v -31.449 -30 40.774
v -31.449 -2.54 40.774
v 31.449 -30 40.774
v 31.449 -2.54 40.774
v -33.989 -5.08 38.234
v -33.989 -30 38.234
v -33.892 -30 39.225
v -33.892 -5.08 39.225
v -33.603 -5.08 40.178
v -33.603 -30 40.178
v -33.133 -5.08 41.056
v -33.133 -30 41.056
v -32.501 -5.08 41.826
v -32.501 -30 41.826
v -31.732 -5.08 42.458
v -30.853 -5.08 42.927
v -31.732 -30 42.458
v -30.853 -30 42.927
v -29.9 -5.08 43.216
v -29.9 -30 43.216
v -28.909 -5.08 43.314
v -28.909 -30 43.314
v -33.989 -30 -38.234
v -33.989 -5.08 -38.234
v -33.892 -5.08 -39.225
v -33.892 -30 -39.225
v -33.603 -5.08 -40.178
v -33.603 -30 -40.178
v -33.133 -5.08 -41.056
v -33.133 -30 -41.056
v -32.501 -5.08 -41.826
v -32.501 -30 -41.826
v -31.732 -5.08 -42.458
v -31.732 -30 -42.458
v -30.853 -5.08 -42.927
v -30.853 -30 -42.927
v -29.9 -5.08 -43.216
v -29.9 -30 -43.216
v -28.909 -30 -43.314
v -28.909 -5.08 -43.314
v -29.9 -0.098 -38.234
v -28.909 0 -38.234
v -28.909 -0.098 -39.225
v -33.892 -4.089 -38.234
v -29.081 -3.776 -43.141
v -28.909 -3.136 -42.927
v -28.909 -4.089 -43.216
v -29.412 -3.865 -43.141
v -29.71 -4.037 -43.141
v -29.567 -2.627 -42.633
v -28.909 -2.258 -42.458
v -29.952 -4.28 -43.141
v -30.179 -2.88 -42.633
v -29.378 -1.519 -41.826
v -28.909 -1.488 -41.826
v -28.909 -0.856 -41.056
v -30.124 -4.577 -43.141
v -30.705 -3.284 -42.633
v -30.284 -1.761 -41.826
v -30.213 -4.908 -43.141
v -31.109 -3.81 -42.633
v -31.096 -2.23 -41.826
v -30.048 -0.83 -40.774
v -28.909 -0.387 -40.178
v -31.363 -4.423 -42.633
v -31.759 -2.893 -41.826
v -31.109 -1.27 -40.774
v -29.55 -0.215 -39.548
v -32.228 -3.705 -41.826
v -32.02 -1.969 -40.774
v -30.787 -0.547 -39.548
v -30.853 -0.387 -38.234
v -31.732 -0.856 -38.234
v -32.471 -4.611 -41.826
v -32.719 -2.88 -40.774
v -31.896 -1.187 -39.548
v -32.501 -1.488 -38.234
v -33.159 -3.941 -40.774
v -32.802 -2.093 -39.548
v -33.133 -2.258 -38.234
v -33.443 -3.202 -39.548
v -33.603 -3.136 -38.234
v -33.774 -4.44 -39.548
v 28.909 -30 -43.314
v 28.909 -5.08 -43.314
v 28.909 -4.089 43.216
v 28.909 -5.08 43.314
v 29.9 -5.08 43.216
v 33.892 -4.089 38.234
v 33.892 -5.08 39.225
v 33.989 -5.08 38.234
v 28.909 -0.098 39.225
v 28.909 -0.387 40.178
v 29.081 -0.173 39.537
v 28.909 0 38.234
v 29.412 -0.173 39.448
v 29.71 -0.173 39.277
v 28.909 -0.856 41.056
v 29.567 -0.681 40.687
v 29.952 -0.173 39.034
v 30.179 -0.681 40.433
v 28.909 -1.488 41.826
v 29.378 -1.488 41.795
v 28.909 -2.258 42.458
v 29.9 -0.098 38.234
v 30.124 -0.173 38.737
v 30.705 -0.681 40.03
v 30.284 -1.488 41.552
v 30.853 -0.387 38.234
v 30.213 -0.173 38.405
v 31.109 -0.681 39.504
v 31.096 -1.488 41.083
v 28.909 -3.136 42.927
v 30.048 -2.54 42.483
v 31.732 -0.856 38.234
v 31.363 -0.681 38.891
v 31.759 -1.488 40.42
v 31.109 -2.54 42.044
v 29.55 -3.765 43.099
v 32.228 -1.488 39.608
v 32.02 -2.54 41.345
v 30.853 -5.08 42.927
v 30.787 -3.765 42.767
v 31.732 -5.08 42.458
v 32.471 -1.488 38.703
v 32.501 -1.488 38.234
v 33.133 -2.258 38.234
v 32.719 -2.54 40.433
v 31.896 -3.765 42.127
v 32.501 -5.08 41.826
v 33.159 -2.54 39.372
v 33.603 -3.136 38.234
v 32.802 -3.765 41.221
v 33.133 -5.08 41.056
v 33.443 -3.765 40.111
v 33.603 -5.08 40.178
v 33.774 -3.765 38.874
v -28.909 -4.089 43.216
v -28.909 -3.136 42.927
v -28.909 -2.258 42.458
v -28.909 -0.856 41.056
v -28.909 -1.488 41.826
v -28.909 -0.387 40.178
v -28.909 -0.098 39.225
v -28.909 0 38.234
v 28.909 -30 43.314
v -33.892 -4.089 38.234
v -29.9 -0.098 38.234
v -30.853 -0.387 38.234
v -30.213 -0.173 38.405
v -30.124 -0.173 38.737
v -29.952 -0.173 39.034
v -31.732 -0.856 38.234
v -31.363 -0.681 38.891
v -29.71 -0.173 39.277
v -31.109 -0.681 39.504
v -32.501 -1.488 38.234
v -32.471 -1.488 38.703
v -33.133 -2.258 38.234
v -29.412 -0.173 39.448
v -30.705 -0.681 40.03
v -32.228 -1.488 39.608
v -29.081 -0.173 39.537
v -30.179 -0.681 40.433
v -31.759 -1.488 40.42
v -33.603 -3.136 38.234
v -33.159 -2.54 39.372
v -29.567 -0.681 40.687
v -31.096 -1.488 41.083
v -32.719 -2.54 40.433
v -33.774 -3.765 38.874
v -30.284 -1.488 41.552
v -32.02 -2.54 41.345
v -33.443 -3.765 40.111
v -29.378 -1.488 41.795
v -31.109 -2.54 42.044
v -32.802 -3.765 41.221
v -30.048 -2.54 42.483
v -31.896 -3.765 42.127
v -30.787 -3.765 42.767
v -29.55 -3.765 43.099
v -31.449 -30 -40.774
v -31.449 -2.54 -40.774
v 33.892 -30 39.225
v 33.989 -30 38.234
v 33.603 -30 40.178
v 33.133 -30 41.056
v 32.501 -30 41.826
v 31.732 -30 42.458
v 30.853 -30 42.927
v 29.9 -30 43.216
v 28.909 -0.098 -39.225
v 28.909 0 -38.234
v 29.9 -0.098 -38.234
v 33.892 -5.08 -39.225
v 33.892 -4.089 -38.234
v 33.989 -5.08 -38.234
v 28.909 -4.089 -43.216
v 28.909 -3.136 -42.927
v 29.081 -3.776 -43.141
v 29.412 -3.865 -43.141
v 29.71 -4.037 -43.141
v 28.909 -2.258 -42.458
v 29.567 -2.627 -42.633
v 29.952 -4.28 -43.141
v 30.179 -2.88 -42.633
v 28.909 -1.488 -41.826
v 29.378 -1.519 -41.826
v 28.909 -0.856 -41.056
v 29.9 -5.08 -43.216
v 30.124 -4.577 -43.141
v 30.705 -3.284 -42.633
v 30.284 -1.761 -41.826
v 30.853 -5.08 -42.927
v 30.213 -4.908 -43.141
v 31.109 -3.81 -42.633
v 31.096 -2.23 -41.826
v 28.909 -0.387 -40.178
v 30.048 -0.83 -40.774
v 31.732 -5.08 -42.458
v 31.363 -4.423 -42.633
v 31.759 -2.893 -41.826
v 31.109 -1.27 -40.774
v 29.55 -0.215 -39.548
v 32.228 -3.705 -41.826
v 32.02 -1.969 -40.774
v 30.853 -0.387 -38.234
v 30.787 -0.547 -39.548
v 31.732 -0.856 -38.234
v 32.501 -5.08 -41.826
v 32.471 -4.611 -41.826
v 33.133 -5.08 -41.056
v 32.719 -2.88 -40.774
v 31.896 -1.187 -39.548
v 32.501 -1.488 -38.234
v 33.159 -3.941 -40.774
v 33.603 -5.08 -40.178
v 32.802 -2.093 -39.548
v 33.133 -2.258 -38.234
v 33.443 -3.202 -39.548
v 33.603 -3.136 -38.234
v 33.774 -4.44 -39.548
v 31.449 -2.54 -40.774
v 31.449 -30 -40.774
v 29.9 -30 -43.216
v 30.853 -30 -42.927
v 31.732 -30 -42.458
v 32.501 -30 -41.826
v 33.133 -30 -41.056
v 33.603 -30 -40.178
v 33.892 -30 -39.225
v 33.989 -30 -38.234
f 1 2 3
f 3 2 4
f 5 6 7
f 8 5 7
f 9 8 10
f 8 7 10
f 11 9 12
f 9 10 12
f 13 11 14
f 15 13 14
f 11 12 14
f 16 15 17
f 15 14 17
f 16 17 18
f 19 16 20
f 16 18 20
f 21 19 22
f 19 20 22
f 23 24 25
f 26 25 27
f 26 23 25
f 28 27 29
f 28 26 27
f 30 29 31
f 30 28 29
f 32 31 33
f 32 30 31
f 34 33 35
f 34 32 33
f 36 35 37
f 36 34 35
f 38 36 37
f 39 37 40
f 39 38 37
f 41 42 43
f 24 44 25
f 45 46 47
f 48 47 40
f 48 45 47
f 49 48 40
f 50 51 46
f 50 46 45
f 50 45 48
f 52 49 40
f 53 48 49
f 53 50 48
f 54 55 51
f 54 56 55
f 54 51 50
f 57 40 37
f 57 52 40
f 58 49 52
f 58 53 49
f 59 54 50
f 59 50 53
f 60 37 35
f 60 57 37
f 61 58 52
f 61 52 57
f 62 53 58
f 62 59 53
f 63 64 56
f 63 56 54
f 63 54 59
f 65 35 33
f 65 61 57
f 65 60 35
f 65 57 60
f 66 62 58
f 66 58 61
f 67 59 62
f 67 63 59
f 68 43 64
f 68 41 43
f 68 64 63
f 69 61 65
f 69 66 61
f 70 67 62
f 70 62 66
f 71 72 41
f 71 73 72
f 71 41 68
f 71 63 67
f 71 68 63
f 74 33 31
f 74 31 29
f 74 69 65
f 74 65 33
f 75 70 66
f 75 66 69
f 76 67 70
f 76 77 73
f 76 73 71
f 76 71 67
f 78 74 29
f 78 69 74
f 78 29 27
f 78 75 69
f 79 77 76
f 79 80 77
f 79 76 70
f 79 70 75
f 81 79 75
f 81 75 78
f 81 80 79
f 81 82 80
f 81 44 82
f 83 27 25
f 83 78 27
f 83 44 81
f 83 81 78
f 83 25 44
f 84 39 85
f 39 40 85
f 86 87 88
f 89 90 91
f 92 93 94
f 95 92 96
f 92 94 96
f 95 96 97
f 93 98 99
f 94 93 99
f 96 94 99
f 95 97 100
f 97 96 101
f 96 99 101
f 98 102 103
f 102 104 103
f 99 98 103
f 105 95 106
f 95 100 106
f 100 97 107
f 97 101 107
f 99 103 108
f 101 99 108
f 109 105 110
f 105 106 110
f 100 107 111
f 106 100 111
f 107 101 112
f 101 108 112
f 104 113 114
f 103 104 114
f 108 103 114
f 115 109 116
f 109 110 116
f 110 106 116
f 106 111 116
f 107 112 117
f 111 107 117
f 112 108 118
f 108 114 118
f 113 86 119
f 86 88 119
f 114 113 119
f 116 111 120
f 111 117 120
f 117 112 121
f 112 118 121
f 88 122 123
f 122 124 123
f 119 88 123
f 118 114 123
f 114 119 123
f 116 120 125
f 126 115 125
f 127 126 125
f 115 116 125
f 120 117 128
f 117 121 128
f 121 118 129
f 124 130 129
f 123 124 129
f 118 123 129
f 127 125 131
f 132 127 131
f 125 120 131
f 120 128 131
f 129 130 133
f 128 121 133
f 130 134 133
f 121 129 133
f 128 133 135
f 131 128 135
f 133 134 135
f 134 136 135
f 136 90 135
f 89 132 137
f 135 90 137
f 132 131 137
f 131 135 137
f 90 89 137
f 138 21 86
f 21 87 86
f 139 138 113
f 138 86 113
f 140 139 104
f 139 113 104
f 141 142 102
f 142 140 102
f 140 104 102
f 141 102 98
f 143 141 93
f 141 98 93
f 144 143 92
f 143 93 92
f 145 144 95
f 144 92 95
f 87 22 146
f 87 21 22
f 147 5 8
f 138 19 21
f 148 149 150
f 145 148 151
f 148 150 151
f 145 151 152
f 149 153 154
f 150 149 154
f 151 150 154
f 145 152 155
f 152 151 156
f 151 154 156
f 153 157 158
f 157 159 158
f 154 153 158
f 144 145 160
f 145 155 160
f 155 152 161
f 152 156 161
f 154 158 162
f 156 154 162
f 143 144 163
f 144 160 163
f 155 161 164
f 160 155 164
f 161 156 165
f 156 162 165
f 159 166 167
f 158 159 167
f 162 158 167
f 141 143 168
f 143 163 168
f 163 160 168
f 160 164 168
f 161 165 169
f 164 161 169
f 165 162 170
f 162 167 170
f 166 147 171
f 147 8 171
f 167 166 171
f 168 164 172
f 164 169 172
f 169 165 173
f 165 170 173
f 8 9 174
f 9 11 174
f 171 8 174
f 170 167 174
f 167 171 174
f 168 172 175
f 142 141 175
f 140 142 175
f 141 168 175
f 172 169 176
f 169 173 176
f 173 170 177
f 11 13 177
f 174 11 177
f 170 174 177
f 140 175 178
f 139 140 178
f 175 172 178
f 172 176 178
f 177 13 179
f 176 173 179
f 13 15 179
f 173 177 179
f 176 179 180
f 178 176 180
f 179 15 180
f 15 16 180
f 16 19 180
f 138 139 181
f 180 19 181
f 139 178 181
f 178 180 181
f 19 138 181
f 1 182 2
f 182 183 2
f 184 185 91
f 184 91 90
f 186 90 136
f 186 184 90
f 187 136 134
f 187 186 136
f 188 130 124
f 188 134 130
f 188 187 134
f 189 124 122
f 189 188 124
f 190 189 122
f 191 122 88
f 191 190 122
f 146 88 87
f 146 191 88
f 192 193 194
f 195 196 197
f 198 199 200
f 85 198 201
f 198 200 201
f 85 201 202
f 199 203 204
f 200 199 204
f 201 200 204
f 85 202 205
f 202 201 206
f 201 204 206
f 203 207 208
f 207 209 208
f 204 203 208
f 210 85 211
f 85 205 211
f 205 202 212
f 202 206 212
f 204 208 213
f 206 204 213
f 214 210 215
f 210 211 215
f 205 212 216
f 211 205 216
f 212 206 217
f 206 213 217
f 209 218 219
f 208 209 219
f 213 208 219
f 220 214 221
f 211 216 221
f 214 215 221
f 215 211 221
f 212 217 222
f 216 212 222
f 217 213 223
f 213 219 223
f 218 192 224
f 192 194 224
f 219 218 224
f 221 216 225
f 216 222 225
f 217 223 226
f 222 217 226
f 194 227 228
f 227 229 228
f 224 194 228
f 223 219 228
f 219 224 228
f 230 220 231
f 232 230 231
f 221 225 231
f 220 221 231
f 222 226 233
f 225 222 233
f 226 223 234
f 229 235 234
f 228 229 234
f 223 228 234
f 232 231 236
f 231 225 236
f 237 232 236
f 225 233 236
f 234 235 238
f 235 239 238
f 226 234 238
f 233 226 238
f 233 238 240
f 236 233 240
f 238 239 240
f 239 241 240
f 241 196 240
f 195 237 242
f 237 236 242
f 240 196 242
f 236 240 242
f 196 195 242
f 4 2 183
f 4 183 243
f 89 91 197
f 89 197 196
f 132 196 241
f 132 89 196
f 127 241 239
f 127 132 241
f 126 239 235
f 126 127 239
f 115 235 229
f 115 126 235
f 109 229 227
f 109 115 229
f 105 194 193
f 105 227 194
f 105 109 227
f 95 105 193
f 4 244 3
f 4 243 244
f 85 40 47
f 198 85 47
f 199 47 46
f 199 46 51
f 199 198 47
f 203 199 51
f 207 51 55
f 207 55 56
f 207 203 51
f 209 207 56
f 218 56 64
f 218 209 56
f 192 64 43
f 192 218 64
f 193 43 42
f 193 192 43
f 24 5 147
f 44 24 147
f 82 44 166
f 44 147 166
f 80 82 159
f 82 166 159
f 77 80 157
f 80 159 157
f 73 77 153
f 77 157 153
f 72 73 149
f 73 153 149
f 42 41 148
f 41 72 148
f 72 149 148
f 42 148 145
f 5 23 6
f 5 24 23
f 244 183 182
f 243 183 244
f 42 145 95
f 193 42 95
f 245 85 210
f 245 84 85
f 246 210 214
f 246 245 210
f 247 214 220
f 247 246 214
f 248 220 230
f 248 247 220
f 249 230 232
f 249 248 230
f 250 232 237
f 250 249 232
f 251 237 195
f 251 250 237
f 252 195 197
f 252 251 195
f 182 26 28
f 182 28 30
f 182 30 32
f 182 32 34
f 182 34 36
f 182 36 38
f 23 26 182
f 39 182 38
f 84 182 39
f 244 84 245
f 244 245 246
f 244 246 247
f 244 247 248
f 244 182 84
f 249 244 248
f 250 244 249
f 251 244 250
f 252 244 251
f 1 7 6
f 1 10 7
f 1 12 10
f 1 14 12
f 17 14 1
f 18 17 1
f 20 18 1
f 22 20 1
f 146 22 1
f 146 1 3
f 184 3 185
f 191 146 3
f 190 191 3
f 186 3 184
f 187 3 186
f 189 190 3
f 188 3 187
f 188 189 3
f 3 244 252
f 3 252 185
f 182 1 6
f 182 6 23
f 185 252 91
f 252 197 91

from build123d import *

# Parameters (mm, degrees)
F0_W     = 67.97842
F0_H     = 86.627372
F1_DEPTH = 30
F2_T     = -2.54
F3_R     = 5.08


with BuildPart() as f1:
    # F0 (on Front) → F1 (new body)
    with BuildSketch(Plane.XZ):
        Rectangle(F0_W, F0_H)
    extrude(amount=F1_DEPTH)

    # F2
    f2_openings = [f1.faces().sort_by_distance(p)[0] for p in [
        (0, -30, 0),
    ]]
    offset(amount=F2_T, openings=f2_openings)

    # F3
    f3_edges = [f1.edges().sort_by_distance(p)[0] for p in [
        (-33.98921, -15, 43.313686),
        (-33.98921, 0, 0),
        (33.98921, -15, 43.313686),
        (0, 0, 43.313686),
        (33.98921, 0, 0),
        (0, 0, -43.313686),
        (33.98921, -15, -43.313686),
        (-33.98921, -15, -43.313686),
    ]]
    fillet(f3_edges, radius=F3_R)


solid = f1.part
